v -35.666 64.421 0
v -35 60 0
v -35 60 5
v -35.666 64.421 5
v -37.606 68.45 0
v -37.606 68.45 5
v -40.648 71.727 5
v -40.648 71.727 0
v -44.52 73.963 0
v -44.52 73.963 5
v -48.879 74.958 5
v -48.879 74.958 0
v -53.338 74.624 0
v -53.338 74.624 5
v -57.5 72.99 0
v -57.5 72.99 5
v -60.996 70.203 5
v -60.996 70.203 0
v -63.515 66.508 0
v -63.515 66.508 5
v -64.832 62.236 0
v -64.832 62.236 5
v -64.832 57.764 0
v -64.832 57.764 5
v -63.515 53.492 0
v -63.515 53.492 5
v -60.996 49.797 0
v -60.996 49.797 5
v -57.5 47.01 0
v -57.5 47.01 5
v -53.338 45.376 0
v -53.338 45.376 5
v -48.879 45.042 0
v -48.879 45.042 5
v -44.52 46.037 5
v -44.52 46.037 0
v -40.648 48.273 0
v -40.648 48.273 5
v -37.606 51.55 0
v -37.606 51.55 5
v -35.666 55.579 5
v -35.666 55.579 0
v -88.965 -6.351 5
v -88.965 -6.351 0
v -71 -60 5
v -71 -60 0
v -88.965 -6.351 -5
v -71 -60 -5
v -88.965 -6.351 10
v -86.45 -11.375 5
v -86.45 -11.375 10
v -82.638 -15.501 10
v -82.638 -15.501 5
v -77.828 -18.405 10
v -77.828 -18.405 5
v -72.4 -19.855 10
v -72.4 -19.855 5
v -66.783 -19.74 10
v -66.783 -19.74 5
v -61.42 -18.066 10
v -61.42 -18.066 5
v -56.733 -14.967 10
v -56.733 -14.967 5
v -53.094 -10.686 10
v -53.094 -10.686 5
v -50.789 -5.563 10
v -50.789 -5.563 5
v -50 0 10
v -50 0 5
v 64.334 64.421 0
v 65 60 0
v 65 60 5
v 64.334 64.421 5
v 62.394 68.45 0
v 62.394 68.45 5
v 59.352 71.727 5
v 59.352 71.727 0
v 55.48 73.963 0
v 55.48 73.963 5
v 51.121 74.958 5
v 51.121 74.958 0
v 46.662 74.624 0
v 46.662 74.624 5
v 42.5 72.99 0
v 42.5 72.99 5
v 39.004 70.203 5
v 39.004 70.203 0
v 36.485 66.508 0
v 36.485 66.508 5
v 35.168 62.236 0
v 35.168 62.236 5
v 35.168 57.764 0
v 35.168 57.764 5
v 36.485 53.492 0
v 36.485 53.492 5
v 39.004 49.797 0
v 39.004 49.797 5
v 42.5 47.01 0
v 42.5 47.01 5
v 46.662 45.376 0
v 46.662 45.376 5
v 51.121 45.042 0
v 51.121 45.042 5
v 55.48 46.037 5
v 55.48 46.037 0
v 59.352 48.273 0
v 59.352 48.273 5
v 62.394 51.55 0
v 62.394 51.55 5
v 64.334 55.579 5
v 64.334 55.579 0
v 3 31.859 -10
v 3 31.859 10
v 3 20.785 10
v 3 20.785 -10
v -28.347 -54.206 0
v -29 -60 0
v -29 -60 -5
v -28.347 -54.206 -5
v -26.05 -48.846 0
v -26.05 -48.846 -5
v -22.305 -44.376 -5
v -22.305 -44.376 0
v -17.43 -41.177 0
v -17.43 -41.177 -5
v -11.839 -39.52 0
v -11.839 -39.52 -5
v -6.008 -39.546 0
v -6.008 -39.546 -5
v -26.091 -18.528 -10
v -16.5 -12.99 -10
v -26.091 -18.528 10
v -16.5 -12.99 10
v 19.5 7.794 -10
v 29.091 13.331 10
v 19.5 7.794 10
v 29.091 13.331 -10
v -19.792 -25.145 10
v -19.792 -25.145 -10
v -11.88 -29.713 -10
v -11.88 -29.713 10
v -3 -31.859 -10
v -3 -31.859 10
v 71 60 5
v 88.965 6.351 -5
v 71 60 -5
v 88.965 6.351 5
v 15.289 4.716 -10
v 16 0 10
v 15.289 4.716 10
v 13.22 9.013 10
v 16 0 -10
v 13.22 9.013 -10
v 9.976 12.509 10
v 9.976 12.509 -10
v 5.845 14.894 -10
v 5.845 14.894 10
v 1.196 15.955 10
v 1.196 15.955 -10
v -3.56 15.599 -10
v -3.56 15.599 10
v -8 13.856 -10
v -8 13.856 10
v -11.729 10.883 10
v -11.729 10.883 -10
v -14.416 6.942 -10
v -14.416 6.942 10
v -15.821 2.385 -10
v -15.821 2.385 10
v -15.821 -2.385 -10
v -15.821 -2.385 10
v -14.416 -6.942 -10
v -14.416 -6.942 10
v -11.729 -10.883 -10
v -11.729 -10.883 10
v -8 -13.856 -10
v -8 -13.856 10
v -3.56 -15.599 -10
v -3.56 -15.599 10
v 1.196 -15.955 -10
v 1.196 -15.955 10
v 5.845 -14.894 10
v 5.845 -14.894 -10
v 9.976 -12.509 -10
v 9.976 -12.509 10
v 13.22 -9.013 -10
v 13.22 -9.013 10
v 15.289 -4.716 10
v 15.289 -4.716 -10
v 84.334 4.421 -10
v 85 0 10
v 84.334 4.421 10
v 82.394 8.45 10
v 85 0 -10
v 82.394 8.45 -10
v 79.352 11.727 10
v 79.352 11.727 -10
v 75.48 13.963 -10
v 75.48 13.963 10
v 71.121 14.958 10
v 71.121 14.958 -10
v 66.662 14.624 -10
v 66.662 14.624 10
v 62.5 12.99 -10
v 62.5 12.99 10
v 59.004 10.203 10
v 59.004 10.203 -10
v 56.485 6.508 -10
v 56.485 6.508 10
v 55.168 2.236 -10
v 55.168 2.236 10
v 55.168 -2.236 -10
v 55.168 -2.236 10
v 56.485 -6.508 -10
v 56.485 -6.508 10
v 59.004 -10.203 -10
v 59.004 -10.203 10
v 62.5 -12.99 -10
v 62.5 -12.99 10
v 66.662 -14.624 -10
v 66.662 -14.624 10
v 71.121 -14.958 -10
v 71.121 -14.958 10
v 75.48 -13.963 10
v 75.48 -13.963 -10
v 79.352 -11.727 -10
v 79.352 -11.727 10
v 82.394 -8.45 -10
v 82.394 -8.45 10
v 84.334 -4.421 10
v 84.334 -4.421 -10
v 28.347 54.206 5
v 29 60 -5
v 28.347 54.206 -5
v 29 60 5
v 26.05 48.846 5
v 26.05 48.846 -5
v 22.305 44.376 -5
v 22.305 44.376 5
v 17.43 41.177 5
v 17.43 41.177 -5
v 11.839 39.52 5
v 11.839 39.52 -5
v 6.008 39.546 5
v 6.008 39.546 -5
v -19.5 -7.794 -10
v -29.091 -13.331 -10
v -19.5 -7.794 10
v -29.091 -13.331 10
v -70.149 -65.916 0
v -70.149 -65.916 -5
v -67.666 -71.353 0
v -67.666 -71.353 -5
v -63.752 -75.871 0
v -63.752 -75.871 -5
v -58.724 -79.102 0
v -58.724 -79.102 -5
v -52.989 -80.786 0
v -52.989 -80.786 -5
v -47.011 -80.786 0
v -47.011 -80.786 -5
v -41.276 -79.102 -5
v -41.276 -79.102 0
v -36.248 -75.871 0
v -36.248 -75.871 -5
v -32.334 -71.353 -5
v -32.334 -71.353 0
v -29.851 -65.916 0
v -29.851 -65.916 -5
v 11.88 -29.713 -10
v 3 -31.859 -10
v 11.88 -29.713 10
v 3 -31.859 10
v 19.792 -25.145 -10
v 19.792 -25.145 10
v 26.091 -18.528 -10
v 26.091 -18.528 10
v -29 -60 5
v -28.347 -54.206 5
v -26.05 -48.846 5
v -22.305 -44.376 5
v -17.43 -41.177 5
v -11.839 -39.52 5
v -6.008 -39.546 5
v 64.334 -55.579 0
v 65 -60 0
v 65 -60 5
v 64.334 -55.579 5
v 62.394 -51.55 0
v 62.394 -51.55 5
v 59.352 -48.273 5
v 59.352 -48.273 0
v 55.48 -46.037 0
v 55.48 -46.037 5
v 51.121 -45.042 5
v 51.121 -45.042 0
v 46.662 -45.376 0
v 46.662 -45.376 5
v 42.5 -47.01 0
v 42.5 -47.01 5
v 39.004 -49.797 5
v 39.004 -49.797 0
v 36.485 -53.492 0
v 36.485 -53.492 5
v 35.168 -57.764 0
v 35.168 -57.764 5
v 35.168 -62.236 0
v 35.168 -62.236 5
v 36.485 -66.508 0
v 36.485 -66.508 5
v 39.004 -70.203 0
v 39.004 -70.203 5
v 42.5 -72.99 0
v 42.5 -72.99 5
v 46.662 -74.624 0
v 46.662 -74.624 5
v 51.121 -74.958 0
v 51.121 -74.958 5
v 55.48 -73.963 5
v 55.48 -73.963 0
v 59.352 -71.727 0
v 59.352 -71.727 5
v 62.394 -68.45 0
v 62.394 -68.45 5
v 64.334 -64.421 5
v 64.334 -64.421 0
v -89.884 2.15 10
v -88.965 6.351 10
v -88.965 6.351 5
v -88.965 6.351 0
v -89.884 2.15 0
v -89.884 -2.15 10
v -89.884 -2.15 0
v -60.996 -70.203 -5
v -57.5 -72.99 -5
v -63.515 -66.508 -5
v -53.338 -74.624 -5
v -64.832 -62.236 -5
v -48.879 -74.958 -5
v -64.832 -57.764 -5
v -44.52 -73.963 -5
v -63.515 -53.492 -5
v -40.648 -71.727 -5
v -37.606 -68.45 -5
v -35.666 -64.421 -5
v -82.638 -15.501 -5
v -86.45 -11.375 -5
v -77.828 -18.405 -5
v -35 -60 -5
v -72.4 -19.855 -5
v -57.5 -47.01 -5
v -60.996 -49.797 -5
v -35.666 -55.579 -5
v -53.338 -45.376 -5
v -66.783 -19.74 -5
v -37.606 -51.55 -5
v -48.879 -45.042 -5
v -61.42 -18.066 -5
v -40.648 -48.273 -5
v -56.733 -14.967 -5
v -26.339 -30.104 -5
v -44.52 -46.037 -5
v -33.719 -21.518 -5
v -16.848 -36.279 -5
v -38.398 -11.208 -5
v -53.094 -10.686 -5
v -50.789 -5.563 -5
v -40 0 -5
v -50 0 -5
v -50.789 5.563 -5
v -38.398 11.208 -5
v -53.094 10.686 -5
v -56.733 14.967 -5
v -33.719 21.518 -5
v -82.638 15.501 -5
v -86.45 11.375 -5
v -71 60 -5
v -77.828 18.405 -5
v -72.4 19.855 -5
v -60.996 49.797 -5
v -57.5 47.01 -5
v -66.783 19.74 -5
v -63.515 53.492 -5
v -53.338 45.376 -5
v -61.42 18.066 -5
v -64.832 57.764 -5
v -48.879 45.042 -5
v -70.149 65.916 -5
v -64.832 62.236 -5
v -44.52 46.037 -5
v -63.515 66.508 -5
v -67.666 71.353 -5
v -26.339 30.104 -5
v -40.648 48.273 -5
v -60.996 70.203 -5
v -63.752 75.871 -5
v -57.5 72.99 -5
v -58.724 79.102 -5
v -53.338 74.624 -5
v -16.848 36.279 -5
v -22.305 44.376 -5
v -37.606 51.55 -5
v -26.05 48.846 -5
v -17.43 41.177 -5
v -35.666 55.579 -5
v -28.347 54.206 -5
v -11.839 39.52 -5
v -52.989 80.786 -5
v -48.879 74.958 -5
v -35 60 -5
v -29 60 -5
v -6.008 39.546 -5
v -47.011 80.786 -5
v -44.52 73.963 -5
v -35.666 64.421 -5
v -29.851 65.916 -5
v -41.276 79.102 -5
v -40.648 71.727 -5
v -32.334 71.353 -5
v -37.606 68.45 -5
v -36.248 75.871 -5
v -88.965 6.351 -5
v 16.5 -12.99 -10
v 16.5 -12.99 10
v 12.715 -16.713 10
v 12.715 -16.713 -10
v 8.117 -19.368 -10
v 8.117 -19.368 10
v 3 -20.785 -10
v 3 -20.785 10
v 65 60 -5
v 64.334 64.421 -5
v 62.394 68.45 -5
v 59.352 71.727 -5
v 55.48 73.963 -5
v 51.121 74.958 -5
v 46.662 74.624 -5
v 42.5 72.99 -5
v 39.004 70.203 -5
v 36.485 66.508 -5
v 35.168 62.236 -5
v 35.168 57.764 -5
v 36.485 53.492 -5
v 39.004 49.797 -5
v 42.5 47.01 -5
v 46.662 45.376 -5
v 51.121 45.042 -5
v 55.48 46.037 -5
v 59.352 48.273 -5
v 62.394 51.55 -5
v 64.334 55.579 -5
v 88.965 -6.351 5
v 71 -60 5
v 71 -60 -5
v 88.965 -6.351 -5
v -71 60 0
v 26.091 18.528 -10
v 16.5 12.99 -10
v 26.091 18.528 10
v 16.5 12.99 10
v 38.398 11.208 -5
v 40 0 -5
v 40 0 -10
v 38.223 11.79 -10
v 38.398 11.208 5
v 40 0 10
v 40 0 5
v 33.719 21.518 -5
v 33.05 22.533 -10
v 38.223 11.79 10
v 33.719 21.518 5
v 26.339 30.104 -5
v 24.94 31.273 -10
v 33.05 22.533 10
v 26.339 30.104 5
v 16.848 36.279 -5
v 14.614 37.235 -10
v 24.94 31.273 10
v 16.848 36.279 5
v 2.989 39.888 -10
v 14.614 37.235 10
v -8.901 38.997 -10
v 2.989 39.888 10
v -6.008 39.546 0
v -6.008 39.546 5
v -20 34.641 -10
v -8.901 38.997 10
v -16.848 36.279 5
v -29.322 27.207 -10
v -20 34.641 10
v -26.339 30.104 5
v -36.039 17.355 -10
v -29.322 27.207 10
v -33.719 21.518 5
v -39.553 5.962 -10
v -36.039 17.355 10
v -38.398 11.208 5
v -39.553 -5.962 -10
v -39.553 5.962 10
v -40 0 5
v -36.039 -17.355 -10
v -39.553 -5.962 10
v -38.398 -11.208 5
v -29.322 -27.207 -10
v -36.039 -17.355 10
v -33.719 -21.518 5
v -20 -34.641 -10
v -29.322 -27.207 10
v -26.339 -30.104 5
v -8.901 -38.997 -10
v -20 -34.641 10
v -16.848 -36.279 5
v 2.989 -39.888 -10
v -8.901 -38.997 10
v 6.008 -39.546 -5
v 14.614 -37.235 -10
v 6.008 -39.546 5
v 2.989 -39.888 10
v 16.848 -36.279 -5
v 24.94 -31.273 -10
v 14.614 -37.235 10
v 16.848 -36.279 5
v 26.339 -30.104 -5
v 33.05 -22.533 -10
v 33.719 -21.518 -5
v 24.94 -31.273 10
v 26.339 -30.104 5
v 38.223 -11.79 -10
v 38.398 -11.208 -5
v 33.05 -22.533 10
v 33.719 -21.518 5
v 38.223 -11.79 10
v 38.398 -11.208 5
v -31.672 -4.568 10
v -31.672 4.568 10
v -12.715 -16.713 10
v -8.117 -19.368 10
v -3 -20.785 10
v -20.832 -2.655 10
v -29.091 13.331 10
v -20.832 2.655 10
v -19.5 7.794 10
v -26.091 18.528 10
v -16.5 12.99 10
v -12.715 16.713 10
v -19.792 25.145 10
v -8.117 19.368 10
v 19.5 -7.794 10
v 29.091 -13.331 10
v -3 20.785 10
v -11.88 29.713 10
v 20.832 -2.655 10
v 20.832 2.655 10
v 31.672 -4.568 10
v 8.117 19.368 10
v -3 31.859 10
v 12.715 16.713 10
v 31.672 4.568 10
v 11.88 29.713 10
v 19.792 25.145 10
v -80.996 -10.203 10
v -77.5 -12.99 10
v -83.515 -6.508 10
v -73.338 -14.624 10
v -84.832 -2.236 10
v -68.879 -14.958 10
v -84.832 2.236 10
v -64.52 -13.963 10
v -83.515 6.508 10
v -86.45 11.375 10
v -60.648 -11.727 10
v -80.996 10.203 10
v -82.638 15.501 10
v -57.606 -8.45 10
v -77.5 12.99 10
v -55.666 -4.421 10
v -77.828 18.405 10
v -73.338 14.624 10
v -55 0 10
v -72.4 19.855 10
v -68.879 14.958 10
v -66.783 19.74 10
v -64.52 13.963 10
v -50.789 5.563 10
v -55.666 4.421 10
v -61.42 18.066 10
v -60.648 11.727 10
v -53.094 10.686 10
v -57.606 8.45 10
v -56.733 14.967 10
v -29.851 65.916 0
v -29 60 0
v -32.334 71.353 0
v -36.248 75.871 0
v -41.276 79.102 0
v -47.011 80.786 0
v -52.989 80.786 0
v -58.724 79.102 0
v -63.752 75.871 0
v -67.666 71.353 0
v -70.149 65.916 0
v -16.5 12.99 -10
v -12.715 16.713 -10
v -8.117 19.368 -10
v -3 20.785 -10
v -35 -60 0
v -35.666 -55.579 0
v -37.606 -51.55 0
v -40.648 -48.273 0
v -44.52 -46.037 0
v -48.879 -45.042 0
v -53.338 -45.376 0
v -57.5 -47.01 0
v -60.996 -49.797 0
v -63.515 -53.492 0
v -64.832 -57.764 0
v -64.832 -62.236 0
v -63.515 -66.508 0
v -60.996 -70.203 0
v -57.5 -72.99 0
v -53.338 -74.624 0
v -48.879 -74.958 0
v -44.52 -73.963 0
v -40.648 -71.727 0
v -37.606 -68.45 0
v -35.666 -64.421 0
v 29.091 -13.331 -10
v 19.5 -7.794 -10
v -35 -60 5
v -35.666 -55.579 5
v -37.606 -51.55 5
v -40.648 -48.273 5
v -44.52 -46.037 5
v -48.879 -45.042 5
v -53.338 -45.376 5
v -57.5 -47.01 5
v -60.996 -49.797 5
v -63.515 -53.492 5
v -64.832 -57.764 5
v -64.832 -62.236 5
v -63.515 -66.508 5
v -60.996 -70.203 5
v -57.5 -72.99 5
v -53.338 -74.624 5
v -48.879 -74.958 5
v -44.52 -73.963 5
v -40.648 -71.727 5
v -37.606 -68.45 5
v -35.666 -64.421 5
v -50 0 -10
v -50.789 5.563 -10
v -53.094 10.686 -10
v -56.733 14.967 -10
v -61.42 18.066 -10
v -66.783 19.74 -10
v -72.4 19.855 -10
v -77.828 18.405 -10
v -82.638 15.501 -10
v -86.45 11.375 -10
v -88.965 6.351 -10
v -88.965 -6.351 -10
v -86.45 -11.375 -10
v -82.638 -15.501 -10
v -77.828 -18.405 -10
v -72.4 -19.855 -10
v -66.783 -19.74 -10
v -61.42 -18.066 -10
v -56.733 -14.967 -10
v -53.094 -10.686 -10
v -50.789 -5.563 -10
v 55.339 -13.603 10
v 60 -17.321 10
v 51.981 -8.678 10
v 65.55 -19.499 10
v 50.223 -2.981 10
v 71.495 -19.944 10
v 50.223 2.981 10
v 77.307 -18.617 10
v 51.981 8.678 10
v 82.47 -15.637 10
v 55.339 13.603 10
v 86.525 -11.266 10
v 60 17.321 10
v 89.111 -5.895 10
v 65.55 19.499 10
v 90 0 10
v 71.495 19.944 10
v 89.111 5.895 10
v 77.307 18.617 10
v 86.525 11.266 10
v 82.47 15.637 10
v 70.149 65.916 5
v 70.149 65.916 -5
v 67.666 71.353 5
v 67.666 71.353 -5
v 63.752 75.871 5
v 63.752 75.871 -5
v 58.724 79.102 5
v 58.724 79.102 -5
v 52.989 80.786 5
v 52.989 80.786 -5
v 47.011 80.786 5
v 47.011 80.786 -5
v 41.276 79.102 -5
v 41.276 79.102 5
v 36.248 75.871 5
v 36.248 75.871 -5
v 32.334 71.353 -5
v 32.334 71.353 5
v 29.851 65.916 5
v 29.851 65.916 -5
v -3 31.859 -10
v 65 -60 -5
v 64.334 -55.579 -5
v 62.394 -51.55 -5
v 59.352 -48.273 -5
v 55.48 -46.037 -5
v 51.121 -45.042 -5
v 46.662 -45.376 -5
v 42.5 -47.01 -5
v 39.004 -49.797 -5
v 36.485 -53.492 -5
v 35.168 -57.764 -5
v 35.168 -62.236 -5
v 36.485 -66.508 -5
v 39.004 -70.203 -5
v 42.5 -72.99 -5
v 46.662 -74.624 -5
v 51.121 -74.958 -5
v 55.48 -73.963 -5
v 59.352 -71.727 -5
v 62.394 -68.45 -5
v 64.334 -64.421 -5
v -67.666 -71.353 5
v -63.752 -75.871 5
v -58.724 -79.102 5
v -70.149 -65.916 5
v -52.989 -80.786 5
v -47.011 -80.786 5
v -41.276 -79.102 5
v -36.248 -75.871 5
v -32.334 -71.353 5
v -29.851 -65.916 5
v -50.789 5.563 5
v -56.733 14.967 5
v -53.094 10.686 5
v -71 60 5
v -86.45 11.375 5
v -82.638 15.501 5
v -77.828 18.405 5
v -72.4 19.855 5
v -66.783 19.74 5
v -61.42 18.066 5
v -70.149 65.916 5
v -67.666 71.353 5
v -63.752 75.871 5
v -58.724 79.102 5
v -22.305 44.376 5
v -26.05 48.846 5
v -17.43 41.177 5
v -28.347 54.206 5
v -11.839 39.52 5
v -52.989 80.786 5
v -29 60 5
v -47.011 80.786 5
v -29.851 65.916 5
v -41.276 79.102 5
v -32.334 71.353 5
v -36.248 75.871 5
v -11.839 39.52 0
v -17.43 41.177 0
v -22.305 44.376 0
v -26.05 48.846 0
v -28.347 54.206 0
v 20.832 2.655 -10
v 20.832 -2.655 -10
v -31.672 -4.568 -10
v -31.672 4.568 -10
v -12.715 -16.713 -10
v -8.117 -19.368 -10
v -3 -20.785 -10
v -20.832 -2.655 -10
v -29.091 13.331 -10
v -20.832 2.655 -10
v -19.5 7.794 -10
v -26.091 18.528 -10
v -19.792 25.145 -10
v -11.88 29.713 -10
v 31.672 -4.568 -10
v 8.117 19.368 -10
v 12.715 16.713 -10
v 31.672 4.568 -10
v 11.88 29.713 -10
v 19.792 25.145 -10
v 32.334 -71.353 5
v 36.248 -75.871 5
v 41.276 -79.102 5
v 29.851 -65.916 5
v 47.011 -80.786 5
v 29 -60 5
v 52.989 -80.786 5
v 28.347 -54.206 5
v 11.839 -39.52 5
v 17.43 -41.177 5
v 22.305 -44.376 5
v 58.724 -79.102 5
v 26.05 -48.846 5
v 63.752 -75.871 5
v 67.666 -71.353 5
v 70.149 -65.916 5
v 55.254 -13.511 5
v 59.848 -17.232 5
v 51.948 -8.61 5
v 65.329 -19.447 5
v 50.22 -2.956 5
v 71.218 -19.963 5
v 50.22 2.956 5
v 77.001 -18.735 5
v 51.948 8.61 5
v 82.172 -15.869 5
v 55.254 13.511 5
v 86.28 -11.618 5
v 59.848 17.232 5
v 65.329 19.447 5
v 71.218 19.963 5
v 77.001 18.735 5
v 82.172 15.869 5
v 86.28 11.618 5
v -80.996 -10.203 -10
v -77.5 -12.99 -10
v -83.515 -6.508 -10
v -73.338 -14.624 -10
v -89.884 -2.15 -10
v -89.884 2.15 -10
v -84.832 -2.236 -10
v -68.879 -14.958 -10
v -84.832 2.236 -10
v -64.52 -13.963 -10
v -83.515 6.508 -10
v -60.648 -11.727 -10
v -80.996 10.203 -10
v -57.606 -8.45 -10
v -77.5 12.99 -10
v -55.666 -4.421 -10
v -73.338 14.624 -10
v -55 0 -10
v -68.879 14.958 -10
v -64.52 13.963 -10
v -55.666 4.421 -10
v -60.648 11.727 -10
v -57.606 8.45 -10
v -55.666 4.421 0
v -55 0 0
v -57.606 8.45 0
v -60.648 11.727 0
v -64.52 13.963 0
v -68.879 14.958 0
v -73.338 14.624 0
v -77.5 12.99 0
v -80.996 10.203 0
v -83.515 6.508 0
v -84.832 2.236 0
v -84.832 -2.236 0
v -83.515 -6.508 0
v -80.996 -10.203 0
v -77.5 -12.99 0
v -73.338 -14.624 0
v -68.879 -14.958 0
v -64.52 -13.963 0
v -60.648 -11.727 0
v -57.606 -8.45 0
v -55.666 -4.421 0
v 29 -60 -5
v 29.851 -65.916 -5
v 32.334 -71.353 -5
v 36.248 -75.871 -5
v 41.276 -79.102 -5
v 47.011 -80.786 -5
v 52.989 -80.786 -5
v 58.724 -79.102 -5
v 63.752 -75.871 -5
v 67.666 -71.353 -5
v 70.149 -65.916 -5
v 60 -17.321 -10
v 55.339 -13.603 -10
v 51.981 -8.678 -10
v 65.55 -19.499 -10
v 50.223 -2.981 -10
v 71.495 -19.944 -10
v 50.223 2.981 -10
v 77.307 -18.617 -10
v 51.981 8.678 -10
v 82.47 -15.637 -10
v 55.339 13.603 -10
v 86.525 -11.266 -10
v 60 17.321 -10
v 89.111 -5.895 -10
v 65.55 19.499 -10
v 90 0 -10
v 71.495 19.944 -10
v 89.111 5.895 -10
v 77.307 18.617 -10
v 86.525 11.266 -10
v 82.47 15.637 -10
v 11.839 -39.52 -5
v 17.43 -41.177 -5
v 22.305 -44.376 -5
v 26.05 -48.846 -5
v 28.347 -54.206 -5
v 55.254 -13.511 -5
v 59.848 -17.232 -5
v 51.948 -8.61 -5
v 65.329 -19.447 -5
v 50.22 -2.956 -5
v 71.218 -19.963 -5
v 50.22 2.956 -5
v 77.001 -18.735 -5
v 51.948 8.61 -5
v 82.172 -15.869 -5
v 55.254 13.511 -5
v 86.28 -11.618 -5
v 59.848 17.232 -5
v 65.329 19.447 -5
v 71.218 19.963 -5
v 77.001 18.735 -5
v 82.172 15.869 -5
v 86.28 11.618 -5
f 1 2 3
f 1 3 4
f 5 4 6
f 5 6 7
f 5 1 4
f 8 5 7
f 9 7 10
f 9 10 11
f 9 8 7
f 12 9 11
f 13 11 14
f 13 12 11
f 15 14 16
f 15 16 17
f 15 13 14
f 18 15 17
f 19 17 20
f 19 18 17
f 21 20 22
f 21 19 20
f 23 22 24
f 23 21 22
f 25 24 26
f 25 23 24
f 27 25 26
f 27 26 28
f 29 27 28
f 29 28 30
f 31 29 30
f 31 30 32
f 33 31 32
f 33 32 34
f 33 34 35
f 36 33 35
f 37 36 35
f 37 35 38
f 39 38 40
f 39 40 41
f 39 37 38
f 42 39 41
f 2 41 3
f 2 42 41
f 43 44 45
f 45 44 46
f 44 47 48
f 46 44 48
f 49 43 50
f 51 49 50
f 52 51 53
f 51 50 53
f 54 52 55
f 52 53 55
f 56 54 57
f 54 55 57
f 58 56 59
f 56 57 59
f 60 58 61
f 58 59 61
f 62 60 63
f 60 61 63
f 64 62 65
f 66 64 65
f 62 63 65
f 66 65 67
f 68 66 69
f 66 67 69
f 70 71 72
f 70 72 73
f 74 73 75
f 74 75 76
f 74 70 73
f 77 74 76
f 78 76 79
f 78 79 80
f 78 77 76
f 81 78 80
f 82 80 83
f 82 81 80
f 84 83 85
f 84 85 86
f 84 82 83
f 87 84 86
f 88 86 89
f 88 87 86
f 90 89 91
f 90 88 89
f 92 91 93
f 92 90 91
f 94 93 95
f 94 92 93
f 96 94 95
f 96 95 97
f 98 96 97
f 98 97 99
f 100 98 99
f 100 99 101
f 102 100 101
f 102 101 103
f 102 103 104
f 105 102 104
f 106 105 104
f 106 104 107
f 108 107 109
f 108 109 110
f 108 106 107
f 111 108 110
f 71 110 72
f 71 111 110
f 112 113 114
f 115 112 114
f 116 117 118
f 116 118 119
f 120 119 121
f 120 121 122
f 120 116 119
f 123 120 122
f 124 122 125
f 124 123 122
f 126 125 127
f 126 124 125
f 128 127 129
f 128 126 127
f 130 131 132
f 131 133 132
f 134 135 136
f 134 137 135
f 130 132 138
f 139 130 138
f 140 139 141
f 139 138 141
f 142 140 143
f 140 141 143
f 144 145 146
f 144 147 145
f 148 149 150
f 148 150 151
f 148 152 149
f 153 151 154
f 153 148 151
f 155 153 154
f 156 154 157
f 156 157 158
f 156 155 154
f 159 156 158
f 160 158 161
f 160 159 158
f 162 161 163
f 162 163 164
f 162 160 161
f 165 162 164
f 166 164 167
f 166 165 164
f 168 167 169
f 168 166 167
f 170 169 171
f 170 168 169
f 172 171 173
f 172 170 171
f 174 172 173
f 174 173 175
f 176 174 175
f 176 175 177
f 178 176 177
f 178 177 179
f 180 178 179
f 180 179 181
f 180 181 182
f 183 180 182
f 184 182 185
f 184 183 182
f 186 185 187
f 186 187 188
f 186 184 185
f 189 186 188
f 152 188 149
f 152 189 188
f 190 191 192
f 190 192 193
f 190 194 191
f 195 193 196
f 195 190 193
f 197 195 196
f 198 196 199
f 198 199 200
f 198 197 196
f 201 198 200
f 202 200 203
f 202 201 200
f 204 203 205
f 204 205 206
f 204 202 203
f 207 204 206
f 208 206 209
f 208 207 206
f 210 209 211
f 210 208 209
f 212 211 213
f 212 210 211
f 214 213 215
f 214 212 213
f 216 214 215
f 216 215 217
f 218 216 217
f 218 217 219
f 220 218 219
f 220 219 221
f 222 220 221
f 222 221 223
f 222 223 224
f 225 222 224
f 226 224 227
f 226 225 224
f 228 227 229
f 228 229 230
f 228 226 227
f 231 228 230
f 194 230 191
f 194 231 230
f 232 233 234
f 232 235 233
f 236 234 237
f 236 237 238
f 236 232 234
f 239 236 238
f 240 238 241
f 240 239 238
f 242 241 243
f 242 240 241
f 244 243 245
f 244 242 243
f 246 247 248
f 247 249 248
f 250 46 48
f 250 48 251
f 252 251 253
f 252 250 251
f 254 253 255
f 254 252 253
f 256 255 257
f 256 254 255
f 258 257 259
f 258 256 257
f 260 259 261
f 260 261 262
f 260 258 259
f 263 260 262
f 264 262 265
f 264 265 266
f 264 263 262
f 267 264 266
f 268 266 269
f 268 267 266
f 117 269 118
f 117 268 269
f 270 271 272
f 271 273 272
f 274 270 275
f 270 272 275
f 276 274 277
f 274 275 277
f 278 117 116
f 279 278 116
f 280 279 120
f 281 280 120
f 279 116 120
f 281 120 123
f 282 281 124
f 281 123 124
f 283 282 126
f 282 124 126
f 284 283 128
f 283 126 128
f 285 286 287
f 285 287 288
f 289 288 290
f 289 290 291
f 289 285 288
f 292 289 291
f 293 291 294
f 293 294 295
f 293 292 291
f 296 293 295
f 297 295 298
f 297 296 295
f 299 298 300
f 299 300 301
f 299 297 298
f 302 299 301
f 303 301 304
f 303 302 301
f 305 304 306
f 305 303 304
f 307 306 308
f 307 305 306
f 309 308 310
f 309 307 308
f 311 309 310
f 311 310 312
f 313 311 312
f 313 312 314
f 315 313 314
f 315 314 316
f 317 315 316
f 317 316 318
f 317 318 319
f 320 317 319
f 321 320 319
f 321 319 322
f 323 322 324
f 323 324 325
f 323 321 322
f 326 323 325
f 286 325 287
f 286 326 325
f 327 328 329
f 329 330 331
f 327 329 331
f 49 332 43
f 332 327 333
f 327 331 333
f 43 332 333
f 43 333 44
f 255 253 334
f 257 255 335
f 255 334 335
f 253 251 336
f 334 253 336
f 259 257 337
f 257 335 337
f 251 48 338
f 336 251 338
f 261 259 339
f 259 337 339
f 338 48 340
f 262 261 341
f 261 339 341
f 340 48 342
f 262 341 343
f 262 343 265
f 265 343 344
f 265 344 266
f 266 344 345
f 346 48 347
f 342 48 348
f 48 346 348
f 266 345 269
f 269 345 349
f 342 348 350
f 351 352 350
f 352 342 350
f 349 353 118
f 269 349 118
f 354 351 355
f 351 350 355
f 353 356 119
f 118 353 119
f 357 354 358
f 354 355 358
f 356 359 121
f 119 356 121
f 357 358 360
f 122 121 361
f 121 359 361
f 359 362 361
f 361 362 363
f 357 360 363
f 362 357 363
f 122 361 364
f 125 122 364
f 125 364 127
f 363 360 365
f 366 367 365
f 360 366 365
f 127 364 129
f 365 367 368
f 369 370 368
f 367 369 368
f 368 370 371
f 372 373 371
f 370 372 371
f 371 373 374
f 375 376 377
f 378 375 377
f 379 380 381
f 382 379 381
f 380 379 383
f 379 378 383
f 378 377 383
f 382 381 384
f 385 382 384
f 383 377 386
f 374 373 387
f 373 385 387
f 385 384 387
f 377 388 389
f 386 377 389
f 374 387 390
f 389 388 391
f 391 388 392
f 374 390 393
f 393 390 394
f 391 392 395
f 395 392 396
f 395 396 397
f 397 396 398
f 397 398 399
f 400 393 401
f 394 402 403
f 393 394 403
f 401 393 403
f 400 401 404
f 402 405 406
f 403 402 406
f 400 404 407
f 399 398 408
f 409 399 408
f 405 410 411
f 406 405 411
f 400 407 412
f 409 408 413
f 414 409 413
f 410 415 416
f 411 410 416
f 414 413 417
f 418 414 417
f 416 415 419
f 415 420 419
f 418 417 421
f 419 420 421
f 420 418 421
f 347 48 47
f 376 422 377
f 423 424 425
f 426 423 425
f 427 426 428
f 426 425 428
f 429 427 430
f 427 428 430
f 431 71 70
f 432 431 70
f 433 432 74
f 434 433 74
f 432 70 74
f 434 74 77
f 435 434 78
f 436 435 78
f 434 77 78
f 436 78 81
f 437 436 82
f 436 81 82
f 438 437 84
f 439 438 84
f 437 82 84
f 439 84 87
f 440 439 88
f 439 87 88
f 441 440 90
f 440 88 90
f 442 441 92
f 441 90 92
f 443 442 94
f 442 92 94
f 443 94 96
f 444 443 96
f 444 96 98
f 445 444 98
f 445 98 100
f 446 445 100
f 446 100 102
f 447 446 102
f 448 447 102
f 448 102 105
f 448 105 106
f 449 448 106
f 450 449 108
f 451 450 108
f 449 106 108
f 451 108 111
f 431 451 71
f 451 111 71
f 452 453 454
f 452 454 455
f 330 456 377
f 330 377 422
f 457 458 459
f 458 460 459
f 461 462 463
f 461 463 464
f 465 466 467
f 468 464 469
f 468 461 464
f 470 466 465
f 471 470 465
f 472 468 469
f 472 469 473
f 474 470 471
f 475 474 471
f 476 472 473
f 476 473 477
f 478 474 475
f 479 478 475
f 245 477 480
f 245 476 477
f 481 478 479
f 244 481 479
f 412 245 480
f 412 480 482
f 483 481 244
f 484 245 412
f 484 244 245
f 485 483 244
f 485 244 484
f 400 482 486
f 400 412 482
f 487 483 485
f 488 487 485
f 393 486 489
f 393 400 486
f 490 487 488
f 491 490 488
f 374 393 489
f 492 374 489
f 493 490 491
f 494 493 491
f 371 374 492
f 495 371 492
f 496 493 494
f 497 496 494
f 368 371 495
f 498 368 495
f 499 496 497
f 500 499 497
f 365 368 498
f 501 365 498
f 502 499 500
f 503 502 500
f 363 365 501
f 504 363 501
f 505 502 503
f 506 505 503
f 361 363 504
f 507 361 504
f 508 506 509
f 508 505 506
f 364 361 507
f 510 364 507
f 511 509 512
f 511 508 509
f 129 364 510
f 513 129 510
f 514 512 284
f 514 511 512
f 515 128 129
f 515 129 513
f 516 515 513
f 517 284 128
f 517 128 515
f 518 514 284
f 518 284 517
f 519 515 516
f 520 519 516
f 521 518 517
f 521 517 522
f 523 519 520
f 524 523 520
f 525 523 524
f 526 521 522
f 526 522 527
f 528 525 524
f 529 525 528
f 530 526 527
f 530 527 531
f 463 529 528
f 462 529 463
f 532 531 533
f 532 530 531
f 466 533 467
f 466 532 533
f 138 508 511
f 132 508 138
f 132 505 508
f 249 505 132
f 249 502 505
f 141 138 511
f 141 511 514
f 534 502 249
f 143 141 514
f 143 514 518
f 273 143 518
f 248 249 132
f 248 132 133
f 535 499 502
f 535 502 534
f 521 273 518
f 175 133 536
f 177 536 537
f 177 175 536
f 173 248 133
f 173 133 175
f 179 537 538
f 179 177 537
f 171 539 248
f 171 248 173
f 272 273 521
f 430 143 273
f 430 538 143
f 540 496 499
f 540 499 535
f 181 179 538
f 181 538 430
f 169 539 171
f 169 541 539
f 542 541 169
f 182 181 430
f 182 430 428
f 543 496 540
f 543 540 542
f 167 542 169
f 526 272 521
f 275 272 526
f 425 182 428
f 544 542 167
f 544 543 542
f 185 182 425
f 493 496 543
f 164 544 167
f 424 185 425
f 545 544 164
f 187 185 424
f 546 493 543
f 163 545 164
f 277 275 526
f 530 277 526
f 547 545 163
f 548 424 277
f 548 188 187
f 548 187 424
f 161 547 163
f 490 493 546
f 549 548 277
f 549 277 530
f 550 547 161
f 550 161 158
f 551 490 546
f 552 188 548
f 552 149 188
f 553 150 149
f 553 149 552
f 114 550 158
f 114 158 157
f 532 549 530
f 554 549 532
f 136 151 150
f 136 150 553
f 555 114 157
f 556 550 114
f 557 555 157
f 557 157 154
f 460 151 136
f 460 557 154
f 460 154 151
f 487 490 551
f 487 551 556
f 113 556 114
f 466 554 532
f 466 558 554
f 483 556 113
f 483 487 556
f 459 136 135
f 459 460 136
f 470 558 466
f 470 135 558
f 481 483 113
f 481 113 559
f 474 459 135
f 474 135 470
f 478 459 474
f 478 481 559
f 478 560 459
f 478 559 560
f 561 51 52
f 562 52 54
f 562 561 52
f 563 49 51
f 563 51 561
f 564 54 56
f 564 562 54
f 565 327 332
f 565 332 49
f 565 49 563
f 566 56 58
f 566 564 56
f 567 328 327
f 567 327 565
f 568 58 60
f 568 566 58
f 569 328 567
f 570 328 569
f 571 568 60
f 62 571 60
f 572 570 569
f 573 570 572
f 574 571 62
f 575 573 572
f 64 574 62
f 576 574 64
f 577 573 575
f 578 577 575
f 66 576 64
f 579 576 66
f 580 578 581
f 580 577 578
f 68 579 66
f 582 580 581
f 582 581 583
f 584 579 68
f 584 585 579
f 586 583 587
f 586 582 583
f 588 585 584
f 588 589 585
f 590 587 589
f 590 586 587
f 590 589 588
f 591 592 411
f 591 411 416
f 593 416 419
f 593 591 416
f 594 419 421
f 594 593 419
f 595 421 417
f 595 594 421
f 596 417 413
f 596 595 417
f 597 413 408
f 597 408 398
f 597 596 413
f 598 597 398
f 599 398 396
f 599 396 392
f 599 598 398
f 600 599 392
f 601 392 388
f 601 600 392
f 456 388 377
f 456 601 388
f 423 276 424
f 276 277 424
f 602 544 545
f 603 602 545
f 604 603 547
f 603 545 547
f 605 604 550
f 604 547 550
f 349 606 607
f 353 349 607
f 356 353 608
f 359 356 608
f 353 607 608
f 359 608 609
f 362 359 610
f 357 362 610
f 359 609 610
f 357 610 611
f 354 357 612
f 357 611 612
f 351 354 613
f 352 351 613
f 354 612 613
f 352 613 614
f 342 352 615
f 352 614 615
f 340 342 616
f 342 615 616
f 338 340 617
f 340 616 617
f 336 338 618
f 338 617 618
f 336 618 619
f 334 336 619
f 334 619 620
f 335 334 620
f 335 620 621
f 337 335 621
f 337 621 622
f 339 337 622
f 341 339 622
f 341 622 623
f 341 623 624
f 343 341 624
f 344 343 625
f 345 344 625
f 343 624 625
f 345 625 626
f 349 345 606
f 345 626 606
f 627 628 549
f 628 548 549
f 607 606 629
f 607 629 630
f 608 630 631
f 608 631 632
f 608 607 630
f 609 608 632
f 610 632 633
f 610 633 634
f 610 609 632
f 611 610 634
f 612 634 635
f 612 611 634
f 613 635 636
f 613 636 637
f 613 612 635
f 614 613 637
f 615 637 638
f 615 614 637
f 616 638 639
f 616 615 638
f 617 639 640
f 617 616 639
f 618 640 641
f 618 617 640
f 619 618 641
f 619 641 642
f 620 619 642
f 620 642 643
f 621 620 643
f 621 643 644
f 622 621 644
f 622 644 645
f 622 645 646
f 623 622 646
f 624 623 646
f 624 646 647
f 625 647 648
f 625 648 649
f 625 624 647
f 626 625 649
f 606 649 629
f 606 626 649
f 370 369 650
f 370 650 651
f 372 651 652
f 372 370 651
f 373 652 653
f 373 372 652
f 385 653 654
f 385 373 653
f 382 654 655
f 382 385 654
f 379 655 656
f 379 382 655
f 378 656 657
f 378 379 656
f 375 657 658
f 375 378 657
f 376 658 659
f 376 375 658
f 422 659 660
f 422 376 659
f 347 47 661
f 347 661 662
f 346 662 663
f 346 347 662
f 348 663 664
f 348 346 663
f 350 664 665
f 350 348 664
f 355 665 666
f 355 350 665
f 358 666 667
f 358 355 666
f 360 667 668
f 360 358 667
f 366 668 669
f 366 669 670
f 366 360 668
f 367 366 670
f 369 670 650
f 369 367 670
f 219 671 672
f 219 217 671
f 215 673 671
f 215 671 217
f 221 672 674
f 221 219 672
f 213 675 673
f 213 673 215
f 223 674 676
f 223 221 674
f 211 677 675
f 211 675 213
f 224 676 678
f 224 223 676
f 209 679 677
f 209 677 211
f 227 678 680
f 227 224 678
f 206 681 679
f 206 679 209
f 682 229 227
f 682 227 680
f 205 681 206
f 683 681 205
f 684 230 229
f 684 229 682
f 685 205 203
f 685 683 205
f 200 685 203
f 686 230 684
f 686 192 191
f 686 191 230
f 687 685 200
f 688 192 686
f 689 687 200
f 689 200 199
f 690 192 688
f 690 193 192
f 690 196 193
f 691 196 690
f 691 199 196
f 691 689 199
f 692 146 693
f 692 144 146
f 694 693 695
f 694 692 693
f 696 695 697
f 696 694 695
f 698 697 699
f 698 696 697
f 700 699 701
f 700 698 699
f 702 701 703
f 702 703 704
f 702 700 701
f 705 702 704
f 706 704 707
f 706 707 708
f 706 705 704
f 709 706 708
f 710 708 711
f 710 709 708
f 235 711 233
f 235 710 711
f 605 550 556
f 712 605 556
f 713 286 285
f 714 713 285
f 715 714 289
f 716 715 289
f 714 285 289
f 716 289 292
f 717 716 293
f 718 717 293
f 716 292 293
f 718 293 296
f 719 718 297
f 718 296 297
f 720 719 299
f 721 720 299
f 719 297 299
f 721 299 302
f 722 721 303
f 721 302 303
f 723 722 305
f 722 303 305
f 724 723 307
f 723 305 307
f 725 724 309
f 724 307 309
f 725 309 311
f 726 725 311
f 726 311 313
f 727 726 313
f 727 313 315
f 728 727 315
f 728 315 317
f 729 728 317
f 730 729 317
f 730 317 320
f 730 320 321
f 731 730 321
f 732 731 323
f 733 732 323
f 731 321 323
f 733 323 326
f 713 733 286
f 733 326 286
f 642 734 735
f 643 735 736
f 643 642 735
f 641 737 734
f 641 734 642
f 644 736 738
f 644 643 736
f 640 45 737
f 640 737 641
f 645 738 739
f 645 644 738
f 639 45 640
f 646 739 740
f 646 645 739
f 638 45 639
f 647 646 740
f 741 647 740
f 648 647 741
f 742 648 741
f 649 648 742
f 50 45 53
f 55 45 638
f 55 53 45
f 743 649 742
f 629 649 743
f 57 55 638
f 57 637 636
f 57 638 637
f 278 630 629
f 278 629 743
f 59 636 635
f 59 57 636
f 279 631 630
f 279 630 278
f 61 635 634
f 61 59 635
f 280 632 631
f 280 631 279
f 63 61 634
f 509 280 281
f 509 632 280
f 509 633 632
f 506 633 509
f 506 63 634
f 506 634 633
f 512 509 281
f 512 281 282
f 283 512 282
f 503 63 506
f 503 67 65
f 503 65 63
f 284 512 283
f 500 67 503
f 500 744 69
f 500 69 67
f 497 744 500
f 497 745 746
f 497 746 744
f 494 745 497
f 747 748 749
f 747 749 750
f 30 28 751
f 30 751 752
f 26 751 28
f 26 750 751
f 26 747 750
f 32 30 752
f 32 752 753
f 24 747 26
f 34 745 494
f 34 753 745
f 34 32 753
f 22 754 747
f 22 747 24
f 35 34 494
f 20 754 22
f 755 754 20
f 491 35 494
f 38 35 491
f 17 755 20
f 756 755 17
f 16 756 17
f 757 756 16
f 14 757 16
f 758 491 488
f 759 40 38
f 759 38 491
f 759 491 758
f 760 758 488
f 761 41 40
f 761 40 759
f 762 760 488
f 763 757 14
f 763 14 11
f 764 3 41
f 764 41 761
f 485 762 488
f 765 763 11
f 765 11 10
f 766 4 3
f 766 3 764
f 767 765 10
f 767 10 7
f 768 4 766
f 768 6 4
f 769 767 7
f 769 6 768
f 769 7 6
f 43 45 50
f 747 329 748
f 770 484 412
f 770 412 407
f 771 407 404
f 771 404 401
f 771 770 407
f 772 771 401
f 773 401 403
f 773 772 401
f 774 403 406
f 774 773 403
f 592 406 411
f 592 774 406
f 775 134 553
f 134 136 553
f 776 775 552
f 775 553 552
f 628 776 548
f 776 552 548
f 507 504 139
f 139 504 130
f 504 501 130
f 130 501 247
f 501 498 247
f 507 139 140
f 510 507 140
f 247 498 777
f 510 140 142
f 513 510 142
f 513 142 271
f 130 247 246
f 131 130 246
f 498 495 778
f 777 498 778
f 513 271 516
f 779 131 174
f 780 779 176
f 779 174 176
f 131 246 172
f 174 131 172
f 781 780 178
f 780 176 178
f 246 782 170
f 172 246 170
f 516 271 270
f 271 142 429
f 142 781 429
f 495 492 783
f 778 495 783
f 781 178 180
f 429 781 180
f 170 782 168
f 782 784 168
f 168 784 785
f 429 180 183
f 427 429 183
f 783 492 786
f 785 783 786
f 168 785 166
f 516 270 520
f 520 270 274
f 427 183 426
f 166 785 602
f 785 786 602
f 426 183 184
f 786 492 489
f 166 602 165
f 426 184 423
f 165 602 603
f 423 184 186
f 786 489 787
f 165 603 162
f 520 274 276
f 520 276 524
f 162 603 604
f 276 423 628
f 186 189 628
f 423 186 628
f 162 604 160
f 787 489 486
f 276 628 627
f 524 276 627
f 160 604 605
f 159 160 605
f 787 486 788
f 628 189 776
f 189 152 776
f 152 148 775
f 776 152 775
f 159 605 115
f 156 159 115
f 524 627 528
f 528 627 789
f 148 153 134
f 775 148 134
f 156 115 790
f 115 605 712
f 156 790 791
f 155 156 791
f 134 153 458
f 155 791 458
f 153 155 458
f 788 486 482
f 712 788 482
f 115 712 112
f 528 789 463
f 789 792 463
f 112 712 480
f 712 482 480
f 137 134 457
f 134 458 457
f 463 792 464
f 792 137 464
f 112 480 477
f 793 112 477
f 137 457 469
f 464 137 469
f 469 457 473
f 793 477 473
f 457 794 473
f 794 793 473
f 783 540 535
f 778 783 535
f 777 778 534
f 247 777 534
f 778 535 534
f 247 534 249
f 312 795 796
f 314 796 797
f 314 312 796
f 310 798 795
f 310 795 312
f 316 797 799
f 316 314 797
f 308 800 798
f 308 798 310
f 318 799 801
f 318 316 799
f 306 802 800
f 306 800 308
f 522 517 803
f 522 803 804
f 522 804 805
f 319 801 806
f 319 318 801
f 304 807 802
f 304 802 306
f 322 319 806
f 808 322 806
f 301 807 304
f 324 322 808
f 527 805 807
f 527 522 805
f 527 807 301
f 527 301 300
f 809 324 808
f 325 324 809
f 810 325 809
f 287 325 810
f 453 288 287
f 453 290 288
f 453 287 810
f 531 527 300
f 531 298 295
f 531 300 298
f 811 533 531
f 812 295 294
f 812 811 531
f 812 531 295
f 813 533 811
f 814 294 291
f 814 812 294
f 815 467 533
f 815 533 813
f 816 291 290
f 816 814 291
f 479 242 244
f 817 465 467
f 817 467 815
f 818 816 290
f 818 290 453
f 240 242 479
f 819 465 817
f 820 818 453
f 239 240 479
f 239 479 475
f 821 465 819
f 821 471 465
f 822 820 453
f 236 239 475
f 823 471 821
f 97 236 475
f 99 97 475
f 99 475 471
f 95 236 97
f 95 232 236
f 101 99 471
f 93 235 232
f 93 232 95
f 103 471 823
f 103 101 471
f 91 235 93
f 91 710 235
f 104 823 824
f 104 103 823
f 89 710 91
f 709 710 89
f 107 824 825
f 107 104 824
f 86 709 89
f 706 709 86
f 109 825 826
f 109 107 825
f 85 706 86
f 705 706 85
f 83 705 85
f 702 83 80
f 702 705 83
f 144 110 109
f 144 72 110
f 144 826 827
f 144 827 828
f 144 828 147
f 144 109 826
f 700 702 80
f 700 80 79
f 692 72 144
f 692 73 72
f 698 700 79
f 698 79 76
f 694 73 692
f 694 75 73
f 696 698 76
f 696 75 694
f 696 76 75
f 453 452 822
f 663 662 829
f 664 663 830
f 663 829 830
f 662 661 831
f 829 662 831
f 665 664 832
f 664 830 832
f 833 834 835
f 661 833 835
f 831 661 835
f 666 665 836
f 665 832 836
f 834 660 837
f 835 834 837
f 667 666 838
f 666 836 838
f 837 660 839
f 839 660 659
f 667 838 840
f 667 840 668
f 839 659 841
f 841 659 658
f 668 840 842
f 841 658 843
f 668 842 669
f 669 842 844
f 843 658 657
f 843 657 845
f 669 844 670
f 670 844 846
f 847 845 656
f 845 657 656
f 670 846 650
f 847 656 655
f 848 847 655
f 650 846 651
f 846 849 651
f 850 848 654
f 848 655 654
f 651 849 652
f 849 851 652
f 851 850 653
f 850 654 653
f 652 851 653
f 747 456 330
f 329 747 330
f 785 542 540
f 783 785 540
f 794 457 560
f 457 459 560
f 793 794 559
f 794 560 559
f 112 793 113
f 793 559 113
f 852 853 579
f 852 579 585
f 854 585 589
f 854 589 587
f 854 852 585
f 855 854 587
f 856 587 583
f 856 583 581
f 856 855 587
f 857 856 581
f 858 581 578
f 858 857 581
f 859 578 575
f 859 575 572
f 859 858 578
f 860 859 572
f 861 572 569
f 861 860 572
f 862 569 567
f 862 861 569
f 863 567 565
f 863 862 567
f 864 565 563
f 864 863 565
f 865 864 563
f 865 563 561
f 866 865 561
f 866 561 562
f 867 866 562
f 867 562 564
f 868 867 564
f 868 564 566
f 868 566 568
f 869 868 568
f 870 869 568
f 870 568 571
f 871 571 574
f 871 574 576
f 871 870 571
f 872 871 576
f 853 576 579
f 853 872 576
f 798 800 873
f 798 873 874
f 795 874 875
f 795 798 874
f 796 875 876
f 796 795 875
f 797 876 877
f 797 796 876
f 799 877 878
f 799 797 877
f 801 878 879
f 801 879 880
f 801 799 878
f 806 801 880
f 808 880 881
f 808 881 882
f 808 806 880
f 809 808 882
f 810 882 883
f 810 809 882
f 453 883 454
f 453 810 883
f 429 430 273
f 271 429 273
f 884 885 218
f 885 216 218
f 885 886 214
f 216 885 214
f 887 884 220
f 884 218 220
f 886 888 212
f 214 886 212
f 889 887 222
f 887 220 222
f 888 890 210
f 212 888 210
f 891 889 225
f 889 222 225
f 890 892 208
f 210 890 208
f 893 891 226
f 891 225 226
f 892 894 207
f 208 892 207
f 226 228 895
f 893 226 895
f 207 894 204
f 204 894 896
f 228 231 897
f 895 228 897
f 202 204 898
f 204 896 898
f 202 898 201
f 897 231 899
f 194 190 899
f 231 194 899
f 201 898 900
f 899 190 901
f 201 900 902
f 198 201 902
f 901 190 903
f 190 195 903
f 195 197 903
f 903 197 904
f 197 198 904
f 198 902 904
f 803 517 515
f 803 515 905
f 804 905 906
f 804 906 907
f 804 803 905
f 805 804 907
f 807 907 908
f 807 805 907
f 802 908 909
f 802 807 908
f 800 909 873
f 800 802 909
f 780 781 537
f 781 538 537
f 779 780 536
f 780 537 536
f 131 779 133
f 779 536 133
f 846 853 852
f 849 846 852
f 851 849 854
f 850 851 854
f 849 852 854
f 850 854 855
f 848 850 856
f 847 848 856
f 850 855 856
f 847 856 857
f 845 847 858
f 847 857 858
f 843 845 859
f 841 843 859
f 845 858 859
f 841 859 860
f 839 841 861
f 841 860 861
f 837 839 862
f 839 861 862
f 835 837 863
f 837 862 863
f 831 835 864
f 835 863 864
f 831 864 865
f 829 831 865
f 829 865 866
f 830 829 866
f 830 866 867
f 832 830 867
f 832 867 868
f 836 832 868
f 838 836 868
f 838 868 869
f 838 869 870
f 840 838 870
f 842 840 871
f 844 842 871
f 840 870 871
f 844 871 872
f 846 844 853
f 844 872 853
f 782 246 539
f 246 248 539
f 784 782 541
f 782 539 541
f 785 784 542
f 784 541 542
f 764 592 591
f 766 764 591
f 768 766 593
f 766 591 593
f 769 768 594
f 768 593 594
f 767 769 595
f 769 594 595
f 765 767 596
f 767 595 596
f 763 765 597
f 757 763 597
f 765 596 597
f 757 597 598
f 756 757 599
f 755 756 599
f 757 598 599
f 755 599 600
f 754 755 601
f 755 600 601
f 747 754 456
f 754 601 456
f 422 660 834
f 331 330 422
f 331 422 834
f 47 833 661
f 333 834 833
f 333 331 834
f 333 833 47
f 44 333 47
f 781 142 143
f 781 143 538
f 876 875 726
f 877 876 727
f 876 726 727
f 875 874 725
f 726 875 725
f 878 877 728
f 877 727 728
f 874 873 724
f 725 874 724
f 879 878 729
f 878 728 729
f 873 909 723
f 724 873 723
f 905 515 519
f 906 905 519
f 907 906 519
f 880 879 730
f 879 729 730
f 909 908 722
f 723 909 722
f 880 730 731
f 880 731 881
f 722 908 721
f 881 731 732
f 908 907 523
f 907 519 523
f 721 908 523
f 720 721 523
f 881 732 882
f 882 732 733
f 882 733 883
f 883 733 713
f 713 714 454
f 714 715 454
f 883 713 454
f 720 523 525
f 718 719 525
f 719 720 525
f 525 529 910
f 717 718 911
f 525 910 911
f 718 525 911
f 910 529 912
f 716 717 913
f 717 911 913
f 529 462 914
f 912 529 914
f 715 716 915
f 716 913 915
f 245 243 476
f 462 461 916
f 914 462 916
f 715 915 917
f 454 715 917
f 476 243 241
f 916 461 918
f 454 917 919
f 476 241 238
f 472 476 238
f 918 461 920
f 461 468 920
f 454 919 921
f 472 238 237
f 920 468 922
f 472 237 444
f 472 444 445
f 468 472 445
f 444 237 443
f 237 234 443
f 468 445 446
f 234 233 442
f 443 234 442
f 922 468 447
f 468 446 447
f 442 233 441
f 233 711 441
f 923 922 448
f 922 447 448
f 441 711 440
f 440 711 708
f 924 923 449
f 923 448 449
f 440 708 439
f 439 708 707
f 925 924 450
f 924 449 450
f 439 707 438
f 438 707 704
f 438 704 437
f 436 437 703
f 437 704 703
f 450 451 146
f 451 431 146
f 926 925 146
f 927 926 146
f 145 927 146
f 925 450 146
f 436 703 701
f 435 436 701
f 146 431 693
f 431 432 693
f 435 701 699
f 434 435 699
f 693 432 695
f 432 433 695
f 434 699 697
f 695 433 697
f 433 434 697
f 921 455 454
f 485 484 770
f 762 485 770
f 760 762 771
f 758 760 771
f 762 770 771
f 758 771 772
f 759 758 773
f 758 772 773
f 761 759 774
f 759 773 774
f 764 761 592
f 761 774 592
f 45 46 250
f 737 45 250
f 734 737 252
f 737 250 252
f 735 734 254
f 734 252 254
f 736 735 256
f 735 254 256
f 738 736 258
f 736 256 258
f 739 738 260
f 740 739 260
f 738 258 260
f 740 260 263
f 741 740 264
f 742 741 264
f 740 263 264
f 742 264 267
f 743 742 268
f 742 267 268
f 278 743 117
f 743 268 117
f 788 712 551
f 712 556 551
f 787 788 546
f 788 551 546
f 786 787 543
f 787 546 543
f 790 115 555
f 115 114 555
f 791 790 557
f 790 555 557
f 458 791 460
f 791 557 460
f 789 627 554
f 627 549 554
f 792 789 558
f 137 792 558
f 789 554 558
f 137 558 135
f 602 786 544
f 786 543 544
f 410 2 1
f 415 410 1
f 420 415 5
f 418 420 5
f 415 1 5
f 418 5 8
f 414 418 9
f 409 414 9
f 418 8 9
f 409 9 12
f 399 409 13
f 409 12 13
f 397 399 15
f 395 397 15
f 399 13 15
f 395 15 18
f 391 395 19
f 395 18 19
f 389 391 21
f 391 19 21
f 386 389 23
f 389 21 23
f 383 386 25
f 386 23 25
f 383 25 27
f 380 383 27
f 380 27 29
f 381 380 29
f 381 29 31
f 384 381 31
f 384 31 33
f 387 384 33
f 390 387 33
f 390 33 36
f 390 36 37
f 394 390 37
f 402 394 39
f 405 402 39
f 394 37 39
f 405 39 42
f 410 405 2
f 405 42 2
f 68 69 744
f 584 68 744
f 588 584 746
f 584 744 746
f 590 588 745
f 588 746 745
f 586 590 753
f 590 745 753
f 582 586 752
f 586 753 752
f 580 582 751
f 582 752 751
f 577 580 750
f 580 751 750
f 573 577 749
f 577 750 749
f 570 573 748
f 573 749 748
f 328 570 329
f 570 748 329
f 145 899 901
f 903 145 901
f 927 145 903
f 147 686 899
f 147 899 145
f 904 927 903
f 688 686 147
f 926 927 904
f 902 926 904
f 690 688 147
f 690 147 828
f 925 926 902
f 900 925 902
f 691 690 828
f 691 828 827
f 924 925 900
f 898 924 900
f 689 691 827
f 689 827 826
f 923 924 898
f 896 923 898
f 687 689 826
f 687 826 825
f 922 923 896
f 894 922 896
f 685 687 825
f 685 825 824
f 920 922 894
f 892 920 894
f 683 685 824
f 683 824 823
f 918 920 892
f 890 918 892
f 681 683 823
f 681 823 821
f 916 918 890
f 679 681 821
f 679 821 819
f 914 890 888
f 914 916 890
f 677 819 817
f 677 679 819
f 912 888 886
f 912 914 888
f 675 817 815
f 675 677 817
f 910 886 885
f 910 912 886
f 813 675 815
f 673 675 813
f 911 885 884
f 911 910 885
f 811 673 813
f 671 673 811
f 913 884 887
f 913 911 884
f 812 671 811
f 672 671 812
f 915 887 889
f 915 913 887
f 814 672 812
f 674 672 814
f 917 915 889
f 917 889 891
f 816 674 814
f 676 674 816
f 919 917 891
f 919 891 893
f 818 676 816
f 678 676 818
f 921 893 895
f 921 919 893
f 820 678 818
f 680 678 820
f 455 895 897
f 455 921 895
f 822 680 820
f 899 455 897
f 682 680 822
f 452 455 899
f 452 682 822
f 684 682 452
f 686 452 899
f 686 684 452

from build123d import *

# Parameters (mm, degrees)
SKETCH1_R             = 20
SKETCH1_R_2           = 15
BOSS_EXTRUDE1_DEPTH   = 10
SKETCH1_R_3           = 40
SKETCH1_R_4           = 16
BOSS_EXTRUDE1_2_DEPTH = 10
BOSS_EXTRUDE1_3_DEPTH = 10
SKETCH1_4_R           = 15
BOSS_EXTRUDE2_DEPTH   = 5


with BuildPart() as part:
    # Sketch1 → Boss-Extrude1 (new, symmetric)
    with BuildSketch(Plane.XY):
        with Locations((-70, 0)):
            Circle(SKETCH1_R)
        with Locations((-70, 0)):
            Circle(SKETCH1_R_2, mode=Mode.SUBTRACT)
    extrude(amount=BOSS_EXTRUDE1_DEPTH, both=True)



with BuildPart() as body_2:
    # Sketch1 → Boss-Extrude1 2 (new, symmetric)
    with BuildSketch(Plane.XY):
        Circle(SKETCH1_R_3)
        with BuildLine():
            ThreePointArc((-16.5, -12.990381057), (-10.5, -18.186533479), (-3, -20.784609691))
            Line((-3, -20.784609691), (-3, -31.859064644))
            ThreePointArc((-3, -31.859064644), (-16, -27.712812921), (-26.090759323, -18.527608533))
            Line((-26.090759323, -18.527608533), (-16.5, -12.990381057))
        make_face(mode=Mode.SUBTRACT)
        with BuildLine():
            ThreePointArc((-19.5, 7.794228634), (-21, 0), (-19.5, -7.794228634))
            Line((-19.5, -7.794228634), (-29.090759323, -13.331456111))
            ThreePointArc((-29.090759323, -13.331456111), (-32, 0), (-29.090759323, 13.331456111))
            Line((-29.090759323, 13.331456111), (-19.5, 7.794228634))
        make_face(mode=Mode.SUBTRACT)
        with BuildLine():
            ThreePointArc((3, -20.784609691), (10.5, -18.186533479), (16.5, -12.990381057))
            Line((16.5, -12.990381057), (26.090759323, -18.527608533))
            ThreePointArc((26.090759323, -18.527608533), (16, -27.712812921), (3, -31.859064644))
            Line((3, -31.859064644), (3, -20.784609691))
        make_face(mode=Mode.SUBTRACT)
        with BuildLine():
            Line((-3, 31.859064644), (-3, 20.784609691))
            ThreePointArc((-3, 20.784609691), (-10.5, 18.186533479), (-16.5, 12.990381057))
            Line((-16.5, 12.990381057), (-26.090759323, 18.527608533))
            ThreePointArc((-26.090759323, 18.527608533), (-16, 27.712812921), (-3, 31.859064644))
        make_face(mode=Mode.SUBTRACT)
        Circle(SKETCH1_R_4, mode=Mode.SUBTRACT)
        with BuildLine():
            ThreePointArc((19.5, -7.794228634), (21, 0), (19.5, 7.794228634))
            Line((19.5, 7.794228634), (29.090759323, 13.331456111))
            ThreePointArc((29.090759323, 13.331456111), (32, 0), (29.090759323, -13.331456111))
            Line((29.090759323, -13.331456111), (19.5, -7.794228634))
        make_face(mode=Mode.SUBTRACT)
        with BuildLine():
            ThreePointArc((16.5, 12.990381057), (10.5, 18.186533479), (3, 20.784609691))
            Line((3, 20.784609691), (3, 31.859064644))
            ThreePointArc((3, 31.859064644), (16, 27.712812921), (26.090759323, 18.527608533))
            Line((26.090759323, 18.527608533), (16.5, 12.990381057))
        make_face(mode=Mode.SUBTRACT)
    extrude(amount=BOSS_EXTRUDE1_2_DEPTH, both=True)


with BuildPart() as body_3:
    # Sketch1 → Boss-Extrude1 3 (new, symmetric)
    with BuildSketch(Plane.XY):
        with Locations((70, 0)):
            Circle(SKETCH1_R)
        with Locations((70, 0)):
            Circle(SKETCH1_R_2, mode=Mode.SUBTRACT)
    extrude(amount=BOSS_EXTRUDE1_3_DEPTH, both=True)


with BuildPart() as part_1:
    add(part.part)

    add(body_2.part)  # Boss-Extrude2 merges body 2

    add(body_3.part)  # Boss-Extrude2 merges body 3
    # Sketch1<4> → Boss-Extrude2 (add, symmetric)
    # profile 1 of 2: a face of its own
    with BuildSketch(Plane.XY):
        with BuildLine():
            Line((-88.964969944, -6.350583834), (-71, -60))
            ThreePointArc((-71, -60), (-50, -81), (-29, -60))
            ThreePointArc((-29, -60), (-22.304723723, -44.376428641), (-6.007722482, -39.546267467))
            ThreePointArc((-6.007722482, -39.546267467), (-40, 0), (-6.007722482, 39.546267467))
            ThreePointArc((-6.007722482, 39.546267467), (-22.304723723, 44.376428641), (-29, 60))
            ThreePointArc((-29, 60), (-50, 81), (-71, 60))
            Line((-71, 60), (-88.964969944, 6.350583834))
            ThreePointArc((-88.964969944, 6.350583834), (-50, 0), (-88.964969944, -6.350583834))
        make_face()
        with Locations((-50, -60)):
            Circle(SKETCH1_4_R, mode=Mode.SUBTRACT)
        with Locations((-50, 60)):
            Circle(SKETCH1_4_R, mode=Mode.SUBTRACT)
    # profile 2 of 2: a face of its own
    with BuildSketch(Plane.XY):
        with BuildLine():
            ThreePointArc((6.007722482, 39.546267467), (40, 0), (6.007722482, -39.546267467))
            ThreePointArc((6.007722482, -39.546267467), (22.304723723, -44.376428641), (29, -60))
            ThreePointArc((29, -60), (50, -81), (71, -60))
            Line((71, -60), (88.964969944, -6.350583834))
            ThreePointArc((88.964969944, -6.350583834), (50, 0), (88.964969944, 6.350583834))
            Line((88.964969944, 6.350583834), (71, 60))
            ThreePointArc((71, 60), (50, 81), (29, 60))
            ThreePointArc((29, 60), (22.304723723, 44.376428641), (6.007722482, 39.546267467))
        make_face()
        with Locations((50, -60)):
            Circle(SKETCH1_4_R, mode=Mode.SUBTRACT)
        with Locations((50, 60)):
            Circle(SKETCH1_4_R, mode=Mode.SUBTRACT)
    extrude(amount=BOSS_EXTRUDE2_DEPTH, both=True)


solid = part_1.part
